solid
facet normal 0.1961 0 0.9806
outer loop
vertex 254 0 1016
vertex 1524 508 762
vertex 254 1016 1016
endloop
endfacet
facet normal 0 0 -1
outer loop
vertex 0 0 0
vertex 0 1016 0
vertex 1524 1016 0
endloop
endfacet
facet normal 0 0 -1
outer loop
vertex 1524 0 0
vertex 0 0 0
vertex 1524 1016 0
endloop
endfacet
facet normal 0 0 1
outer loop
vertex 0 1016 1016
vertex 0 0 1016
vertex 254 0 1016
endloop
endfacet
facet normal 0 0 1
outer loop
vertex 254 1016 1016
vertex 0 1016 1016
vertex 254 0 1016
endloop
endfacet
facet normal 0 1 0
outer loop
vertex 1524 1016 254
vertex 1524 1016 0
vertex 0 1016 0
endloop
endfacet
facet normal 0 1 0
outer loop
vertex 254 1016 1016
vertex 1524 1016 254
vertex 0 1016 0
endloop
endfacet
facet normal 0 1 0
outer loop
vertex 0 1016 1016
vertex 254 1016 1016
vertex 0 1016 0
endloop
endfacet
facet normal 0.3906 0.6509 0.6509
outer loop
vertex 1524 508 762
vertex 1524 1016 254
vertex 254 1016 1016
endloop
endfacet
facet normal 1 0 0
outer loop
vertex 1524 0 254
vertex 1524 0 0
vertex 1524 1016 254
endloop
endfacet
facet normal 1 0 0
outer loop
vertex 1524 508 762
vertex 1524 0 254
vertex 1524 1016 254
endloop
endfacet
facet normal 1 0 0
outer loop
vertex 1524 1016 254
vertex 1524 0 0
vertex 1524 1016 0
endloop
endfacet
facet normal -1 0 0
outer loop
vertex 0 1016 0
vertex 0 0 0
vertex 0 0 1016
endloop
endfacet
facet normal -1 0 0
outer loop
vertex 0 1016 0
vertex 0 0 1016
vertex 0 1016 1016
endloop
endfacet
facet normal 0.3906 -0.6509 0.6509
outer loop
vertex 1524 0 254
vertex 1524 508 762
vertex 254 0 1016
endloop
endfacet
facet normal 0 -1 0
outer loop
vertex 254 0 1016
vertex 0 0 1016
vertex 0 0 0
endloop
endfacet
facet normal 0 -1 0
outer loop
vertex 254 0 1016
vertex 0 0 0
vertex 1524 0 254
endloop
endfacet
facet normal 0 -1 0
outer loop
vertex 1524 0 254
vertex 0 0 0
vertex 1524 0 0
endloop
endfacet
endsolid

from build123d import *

# Parameters (mm, degrees)
SKETCH1_W           = 1270
SKETCH1_H           = 1016
SKETCH1_W_2         = 254
BOSS_EXTRUDE1_DEPTH = 1016


with BuildPart() as part:
    # Sketch1 → Boss-Extrude1 (new body)
    with BuildSketch(Plane.XY):
        with Locations((889, 508)):
            Rectangle(SKETCH1_W, SKETCH1_H)
        with Locations((127, 508)):
            Rectangle(SKETCH1_W_2, SKETCH1_H)
    extrude(amount=BOSS_EXTRUDE1_DEPTH)

    # SurfaceCut2
    split(bisect_by=Plane(origin=(555.355932203, 925.593220339, 925.593220339), x_dir=(-0.9205746178983233, 0.27617238536949706, 0.27617238536949706), z_dir=(-0.3905667329424717, -0.6509445549041193, -0.6509445549041194)), keep=Keep.TOP)

    # SurfaceCut3
    split(bisect_by=Plane(origin=(297.050847458, -495.084745763, 495.084745763), x_dir=(-0.9205746178983234, -0.27617238536949706, 0.2761723853694971), z_dir=(-0.39056673294247174, 0.6509445549041194, -0.6509445549041194)), keep=Keep.TOP)

    # SurfaceCut4
    split(bisect_by=Plane(origin=(205.153846154, 0, 1025.769230769), x_dir=(-0.9805806756909202, 0, 0.196116135138184), z_dir=(-0.196116135138184, 0, -0.9805806756909202)), keep=Keep.TOP)


solid = part.part
